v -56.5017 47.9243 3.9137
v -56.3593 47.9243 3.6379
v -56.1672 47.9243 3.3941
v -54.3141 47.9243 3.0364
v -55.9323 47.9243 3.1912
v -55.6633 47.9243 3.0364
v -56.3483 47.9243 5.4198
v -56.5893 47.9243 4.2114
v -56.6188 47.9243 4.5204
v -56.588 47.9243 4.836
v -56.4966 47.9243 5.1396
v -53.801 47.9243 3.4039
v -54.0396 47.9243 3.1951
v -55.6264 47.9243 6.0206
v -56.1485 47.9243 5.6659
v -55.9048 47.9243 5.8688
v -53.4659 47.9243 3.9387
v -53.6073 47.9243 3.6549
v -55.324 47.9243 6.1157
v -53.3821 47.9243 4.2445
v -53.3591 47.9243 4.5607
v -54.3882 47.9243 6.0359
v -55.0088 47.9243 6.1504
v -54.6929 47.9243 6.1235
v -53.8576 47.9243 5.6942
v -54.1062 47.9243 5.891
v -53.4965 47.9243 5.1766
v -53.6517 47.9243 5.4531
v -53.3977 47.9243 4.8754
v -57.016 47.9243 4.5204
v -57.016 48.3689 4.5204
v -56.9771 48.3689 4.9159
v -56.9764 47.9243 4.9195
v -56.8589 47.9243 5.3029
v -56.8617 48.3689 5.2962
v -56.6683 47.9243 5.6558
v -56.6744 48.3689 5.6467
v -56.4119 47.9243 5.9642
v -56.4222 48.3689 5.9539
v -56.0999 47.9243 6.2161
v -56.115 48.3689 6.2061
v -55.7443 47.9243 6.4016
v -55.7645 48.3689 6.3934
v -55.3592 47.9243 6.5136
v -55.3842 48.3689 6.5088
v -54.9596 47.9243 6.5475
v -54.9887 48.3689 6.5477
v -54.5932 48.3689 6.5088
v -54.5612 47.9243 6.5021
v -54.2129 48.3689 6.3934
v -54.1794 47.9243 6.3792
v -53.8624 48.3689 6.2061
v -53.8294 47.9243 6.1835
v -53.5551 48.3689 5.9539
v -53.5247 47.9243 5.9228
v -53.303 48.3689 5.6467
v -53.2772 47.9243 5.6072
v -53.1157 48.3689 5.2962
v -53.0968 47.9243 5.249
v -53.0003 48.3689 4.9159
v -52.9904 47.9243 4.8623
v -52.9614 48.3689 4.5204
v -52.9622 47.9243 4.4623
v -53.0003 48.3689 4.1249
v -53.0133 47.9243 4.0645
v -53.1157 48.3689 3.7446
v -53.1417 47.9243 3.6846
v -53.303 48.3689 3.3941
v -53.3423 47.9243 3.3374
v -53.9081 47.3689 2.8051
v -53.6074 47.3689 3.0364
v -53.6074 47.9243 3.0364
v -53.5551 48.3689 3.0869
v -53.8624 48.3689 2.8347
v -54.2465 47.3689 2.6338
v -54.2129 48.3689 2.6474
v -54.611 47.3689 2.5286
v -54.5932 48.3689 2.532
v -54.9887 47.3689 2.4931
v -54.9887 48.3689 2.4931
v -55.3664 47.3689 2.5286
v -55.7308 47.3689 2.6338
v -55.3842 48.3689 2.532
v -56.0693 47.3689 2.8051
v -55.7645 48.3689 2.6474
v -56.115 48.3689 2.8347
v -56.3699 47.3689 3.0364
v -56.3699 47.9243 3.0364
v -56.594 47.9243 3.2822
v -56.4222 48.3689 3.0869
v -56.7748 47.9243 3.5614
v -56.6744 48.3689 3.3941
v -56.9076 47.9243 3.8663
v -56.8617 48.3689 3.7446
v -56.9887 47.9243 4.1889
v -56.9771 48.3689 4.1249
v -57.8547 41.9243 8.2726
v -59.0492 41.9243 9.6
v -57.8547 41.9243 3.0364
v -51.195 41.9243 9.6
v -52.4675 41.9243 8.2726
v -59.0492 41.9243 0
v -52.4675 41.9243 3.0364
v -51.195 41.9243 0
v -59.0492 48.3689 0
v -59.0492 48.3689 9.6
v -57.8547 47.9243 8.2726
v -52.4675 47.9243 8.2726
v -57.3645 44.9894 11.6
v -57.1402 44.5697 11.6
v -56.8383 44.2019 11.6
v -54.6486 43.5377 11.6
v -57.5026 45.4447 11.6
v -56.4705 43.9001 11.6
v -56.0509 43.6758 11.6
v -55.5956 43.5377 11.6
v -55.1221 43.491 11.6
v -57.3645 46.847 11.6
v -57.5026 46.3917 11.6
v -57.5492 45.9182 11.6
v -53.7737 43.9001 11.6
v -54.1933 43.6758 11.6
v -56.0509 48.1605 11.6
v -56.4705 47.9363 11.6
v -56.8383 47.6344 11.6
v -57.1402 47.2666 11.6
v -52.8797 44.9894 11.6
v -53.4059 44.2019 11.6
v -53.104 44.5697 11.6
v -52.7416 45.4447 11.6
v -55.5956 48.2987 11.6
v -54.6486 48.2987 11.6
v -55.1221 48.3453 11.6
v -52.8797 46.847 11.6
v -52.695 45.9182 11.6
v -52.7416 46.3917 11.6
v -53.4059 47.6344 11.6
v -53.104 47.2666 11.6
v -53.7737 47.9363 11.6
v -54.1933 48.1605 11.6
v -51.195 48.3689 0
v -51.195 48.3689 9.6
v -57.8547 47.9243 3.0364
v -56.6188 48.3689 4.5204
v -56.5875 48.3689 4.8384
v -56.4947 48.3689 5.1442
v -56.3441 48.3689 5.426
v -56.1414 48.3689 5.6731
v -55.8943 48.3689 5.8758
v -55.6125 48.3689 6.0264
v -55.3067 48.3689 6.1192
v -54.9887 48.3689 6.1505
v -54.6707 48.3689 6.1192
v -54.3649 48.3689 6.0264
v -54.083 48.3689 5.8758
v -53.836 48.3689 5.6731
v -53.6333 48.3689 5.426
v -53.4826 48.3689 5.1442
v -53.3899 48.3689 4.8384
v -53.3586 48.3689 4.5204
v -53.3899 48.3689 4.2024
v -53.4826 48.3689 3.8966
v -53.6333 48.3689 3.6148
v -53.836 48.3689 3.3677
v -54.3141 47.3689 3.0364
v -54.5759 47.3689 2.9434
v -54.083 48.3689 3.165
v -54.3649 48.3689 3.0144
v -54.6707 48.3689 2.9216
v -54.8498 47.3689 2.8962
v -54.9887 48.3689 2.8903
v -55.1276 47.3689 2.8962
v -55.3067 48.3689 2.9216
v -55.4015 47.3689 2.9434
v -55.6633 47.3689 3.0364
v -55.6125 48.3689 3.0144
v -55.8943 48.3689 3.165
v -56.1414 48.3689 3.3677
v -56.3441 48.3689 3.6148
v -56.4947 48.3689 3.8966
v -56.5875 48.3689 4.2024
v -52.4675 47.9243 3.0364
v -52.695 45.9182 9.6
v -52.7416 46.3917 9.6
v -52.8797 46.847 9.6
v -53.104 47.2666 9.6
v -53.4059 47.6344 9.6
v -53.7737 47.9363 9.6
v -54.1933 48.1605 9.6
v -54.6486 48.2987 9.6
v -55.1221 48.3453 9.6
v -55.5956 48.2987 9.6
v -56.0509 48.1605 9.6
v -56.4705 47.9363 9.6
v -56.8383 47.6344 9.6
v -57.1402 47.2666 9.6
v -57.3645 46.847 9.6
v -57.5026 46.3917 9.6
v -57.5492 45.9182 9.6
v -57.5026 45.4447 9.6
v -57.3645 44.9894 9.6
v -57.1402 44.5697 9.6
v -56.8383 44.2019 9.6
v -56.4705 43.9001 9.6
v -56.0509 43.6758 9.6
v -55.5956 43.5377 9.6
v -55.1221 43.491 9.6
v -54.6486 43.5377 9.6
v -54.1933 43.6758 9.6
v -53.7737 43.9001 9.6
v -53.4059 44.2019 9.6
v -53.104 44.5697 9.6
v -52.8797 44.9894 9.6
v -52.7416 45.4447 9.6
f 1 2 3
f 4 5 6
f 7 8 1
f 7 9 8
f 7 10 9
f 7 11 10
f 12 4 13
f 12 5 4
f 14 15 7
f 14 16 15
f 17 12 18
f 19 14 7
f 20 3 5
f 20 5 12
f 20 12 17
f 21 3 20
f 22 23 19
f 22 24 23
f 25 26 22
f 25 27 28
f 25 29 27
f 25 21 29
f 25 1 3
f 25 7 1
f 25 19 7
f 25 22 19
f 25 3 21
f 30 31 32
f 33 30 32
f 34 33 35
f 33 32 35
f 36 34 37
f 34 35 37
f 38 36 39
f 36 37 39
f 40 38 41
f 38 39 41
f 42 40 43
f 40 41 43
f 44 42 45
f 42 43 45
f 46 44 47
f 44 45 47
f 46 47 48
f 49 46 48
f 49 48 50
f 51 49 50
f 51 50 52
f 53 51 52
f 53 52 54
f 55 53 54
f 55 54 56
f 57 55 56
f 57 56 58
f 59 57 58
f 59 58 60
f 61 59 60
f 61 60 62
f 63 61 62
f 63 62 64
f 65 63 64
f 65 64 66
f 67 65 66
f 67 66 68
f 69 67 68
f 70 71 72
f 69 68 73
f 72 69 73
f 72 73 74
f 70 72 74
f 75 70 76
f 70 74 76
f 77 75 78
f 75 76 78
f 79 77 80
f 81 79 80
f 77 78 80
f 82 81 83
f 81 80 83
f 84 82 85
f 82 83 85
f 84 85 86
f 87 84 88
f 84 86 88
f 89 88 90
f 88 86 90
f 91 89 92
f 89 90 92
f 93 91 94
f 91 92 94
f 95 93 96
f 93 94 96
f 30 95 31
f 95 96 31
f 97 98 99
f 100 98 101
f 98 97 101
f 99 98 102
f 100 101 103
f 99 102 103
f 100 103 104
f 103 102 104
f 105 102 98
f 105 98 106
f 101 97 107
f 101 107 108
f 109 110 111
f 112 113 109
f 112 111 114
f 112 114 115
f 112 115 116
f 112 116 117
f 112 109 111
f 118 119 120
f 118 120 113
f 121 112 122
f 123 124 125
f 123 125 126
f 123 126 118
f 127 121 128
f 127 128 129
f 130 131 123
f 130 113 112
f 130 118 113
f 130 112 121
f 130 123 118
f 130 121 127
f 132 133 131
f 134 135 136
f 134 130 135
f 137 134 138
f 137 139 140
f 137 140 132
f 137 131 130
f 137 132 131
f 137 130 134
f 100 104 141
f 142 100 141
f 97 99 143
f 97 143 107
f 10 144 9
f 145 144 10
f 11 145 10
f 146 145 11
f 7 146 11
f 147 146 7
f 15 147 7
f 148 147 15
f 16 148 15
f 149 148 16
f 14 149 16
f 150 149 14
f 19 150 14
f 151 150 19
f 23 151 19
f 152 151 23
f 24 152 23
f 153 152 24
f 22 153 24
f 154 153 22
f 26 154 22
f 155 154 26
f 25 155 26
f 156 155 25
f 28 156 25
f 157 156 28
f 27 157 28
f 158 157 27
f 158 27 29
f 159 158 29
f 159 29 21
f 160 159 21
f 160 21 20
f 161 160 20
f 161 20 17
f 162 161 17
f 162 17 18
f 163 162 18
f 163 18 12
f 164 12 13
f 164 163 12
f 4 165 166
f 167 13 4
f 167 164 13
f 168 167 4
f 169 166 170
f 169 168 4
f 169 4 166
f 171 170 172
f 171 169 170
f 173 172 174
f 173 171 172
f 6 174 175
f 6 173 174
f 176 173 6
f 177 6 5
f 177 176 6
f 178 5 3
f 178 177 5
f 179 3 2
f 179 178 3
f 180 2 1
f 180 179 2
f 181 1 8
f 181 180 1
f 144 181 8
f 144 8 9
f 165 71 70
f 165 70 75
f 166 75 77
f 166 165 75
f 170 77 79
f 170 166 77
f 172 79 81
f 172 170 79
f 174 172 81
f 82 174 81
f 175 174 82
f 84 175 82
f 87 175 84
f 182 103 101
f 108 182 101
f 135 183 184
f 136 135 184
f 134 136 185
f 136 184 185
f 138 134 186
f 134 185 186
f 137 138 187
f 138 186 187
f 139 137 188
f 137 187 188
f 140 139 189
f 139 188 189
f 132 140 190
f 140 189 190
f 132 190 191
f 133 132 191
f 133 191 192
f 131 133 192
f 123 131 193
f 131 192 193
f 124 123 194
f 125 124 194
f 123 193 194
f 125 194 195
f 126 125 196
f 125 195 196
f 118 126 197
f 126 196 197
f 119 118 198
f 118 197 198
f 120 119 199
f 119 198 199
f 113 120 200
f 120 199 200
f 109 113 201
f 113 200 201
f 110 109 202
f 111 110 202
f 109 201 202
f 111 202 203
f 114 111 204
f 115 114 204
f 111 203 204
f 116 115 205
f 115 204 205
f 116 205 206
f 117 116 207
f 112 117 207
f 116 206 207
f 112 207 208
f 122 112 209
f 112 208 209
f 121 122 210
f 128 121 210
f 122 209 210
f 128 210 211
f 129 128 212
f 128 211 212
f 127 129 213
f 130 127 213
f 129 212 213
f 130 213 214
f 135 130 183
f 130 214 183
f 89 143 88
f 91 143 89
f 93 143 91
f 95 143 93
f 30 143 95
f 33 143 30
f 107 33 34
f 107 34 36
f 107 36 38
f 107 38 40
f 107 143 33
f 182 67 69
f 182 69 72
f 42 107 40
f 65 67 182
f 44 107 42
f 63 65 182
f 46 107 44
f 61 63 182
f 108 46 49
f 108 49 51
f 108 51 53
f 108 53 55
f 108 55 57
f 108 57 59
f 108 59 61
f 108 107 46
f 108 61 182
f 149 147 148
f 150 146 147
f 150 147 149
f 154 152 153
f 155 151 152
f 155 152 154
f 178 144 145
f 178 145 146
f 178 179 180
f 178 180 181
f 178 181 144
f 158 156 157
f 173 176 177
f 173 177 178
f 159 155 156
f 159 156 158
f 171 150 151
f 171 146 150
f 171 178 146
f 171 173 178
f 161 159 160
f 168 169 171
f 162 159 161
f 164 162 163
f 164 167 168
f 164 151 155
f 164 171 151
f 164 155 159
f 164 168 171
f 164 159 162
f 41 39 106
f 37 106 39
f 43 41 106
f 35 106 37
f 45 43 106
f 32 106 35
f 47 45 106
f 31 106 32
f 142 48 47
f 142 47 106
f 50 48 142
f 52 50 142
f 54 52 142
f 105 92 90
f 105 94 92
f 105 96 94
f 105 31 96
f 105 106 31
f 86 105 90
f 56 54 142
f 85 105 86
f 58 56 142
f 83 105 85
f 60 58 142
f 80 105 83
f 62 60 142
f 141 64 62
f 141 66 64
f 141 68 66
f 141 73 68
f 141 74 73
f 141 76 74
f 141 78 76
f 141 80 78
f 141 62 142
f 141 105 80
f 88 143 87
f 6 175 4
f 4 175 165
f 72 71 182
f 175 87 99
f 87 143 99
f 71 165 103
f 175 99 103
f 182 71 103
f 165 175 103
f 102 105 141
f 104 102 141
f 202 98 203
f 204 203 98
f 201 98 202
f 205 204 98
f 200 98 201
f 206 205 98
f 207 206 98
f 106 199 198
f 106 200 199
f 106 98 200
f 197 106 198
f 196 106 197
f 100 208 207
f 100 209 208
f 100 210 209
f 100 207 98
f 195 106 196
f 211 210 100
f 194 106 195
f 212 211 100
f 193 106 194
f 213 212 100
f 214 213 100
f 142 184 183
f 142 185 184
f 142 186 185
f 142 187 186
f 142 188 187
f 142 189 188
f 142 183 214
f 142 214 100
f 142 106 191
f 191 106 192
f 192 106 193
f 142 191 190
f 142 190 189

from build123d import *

# Parameters (mm, degrees)
F0_W     = 7.854256779
F0_H     = 6.4445212483
F1_DEPTH = 9.6
F2_R     = 2.4271283895
F3_DEPTH = 2
F4_W     = 5.3872168064
F4_H     = 5.2361704875
F5_DEPTH = 6
F6_R     = 2.0273342164
F6_R_2   = 1.6301233672
F7_DEPTH = 1


with BuildPart() as f1:
    # F0 (on Top) → F1 (new body)
    with BuildSketch(Plane.XY):
        with Locations((-55.12210913, 45.146599412)):
            Rectangle(F0_W, F0_H)
    extrude(amount=F1_DEPTH)

    # F2 (on face) → F3 (join)
    with BuildSketch(Plane.XY.offset(9.6)):
        with Locations((-55.12210913, 45.918174088)):
            Circle(F2_R)
    extrude(amount=F3_DEPTH)

    # F4 (on face) → F5 (cut)
    with BuildSketch(Plane.XZ.offset(-41.9243387878)):
        with Locations((-55.1610887051, 5.6545048719)):
            Rectangle(F4_W, F4_H)
    extrude(amount=-F5_DEPTH, mode=Mode.SUBTRACT)

    # F6 (on face) → F7 (cut)
    with BuildSketch(Plane(origin=(0, 48.3688600361, 0), x_dir=(-1, 0, 0), z_dir=(0, 1, 0))):
        with Locations((54.9886859953, 4.5204013586)):
            Circle(F6_R)
        with Locations((54.9886859953, 4.5204013586)):
            Circle(F6_R_2, mode=Mode.SUBTRACT)
    extrude(amount=-F7_DEPTH, mode=Mode.SUBTRACT)


solid = f1.part
